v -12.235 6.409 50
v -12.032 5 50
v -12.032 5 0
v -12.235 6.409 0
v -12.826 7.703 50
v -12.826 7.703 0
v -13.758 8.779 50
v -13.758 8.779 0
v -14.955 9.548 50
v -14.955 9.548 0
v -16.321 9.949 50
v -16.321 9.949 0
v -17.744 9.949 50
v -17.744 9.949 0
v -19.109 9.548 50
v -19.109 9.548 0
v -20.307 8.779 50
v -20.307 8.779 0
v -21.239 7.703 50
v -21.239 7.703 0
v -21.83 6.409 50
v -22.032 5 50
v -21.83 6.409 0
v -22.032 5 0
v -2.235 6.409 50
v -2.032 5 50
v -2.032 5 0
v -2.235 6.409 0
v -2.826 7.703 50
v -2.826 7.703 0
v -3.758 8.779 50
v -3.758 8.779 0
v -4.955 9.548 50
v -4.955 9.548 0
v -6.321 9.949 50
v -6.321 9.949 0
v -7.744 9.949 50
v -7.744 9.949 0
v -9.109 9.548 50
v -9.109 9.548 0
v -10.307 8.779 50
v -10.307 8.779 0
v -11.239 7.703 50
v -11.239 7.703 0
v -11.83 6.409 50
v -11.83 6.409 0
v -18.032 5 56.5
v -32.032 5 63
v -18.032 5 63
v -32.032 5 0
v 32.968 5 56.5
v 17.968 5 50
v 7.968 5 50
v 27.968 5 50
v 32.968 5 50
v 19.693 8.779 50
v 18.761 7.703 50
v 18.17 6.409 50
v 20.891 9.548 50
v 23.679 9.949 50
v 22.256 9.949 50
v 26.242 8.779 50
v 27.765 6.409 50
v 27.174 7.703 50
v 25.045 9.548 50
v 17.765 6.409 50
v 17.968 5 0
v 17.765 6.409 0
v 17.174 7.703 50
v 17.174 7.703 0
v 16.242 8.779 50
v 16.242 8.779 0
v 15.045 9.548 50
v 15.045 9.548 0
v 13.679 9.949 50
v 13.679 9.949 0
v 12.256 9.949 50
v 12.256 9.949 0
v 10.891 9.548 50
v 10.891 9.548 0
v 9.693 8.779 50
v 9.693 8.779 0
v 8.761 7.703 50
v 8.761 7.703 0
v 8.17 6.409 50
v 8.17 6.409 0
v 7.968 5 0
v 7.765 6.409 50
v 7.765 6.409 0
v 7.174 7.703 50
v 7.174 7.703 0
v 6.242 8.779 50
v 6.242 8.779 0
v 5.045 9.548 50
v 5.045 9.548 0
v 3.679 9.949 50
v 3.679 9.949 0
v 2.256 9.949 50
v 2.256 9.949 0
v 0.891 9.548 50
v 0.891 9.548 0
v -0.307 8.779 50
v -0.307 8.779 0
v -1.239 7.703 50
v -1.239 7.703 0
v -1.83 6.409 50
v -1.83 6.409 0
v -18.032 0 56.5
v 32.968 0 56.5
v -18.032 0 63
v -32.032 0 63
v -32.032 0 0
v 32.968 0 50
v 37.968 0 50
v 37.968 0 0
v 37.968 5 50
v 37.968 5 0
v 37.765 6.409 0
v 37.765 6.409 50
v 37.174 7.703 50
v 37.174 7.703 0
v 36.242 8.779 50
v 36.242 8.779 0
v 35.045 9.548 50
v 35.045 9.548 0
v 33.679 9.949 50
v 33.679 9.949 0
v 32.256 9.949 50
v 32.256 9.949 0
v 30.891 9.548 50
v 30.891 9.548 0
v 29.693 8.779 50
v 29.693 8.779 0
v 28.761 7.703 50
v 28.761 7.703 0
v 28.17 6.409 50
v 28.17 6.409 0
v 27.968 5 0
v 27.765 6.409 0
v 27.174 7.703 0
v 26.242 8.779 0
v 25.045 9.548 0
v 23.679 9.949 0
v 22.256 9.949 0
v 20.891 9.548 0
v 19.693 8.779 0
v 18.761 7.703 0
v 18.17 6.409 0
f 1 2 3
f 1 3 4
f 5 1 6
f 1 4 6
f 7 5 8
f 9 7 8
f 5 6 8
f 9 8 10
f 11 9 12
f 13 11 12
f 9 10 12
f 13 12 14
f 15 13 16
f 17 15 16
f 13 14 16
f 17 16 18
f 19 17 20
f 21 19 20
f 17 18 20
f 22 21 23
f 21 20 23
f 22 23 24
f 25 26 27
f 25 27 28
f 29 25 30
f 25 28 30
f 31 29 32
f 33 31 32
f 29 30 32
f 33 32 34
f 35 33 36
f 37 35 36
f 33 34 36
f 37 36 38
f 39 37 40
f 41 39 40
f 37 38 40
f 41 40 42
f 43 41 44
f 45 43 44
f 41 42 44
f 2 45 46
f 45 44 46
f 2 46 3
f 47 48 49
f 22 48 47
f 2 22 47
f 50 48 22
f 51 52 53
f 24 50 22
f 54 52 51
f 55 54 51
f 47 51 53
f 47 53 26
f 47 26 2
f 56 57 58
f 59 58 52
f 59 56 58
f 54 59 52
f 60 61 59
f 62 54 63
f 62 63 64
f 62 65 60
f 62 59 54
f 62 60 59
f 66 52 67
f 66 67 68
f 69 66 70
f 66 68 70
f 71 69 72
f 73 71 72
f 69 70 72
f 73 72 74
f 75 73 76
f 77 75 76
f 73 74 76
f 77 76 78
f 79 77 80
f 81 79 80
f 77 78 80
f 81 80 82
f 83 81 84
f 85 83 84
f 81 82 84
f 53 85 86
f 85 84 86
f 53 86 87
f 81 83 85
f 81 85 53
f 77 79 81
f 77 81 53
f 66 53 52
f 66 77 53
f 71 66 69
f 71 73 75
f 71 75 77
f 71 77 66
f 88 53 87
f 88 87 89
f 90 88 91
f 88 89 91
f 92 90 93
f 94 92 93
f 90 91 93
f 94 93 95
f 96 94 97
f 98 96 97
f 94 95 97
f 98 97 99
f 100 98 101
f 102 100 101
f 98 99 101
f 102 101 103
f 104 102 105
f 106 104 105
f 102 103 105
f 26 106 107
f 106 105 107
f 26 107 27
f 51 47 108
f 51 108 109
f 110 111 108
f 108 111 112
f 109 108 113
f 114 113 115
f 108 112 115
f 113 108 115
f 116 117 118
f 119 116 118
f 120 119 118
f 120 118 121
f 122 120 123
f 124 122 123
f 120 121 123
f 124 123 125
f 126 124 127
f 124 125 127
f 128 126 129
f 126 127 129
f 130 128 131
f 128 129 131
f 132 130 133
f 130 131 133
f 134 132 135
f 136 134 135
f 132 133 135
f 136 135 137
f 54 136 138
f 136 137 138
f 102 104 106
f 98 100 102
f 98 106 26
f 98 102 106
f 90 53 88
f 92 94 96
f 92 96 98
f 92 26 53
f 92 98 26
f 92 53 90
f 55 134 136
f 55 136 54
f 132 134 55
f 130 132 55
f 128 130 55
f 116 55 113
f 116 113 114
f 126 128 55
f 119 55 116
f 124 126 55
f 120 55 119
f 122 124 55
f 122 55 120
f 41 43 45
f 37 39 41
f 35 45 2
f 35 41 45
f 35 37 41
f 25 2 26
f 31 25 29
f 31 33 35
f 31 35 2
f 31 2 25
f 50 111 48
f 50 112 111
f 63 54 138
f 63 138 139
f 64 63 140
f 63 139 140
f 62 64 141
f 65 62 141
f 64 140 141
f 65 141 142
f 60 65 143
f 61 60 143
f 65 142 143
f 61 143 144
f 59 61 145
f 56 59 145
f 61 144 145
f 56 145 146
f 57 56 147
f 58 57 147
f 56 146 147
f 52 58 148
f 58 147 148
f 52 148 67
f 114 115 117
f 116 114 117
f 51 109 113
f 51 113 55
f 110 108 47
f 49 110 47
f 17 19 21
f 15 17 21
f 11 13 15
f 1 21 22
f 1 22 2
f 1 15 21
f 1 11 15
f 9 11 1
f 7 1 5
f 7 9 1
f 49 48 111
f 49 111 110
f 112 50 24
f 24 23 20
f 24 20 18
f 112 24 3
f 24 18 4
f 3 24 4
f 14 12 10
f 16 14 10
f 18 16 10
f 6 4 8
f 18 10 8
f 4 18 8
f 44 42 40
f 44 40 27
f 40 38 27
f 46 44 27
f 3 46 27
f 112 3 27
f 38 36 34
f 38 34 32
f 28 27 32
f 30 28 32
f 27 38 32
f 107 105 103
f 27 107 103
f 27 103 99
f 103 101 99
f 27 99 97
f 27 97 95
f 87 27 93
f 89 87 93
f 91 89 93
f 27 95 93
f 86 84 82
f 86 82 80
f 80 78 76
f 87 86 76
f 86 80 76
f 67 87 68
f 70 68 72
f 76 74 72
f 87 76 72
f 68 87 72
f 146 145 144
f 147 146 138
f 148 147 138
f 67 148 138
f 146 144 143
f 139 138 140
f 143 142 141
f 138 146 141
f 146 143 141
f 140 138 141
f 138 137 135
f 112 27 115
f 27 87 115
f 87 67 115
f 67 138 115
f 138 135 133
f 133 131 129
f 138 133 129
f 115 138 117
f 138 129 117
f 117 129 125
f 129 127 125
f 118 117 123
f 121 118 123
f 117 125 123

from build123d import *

# Parameters (mm, degrees)
F1_DEPTH = 50
F2_W     = 70
F2_H     = 5
F3_DEPTH = 6.5
F5_W     = 5
F5_H     = 6.5
F6_DEPTH = 5
F4_W     = 14
F4_H     = 5
F7_DEPTH = 6.5


with BuildPart() as f1:
    # F0 (on Top) → F1 (new body)
    with BuildSketch(Plane.XY):
        with BuildLine():
            Line((-32.032276, 5), (-32.032276, 0))
            Line((-32.032276, 0), (37.967724, 0))
            Line((37.967724, 0), (37.967724, 5))
            ThreePointArc((37.967724, 5), (32.967724, 10), (27.967724, 5))
            ThreePointArc((27.967724, 5), (22.967724, 10), (17.967724, 5))
            ThreePointArc((17.967724, 5), (12.967724, 10), (7.967724, 5))
            ThreePointArc((7.967724, 5), (2.967724, 10), (-2.032276, 5))
            ThreePointArc((-2.032276, 5), (-7.032276, 10), (-12.032276, 5))
            ThreePointArc((-12.032276, 5), (-17.032276, 10), (-22.032276, 5))
            Line((-22.032276, 5), (-32.032276, 5))
        make_face()
    extrude(amount=F1_DEPTH)

    # F2 (on face) → F3 (join)
    with BuildSketch(Plane.XY.offset(50)):
        with Locations((2.967724, 2.5)):
            Rectangle(F2_W, F2_H)
    extrude(amount=F3_DEPTH)

    # F5 (on face) → F6 (cut)
    with BuildSketch(Plane.YZ.offset(37.967724)):
        with Locations((2.5, 53.25)):
            Rectangle(F5_W, F5_H)
    extrude(amount=-F6_DEPTH, mode=Mode.SUBTRACT)

    # F4 (on face) → F7 (join)
    with BuildSketch(Plane.XY.offset(56.5)):
        with Locations((-25.032276, 2.5)):
            Rectangle(F4_W, F4_H)
    extrude(amount=F7_DEPTH)


solid = f1.part
